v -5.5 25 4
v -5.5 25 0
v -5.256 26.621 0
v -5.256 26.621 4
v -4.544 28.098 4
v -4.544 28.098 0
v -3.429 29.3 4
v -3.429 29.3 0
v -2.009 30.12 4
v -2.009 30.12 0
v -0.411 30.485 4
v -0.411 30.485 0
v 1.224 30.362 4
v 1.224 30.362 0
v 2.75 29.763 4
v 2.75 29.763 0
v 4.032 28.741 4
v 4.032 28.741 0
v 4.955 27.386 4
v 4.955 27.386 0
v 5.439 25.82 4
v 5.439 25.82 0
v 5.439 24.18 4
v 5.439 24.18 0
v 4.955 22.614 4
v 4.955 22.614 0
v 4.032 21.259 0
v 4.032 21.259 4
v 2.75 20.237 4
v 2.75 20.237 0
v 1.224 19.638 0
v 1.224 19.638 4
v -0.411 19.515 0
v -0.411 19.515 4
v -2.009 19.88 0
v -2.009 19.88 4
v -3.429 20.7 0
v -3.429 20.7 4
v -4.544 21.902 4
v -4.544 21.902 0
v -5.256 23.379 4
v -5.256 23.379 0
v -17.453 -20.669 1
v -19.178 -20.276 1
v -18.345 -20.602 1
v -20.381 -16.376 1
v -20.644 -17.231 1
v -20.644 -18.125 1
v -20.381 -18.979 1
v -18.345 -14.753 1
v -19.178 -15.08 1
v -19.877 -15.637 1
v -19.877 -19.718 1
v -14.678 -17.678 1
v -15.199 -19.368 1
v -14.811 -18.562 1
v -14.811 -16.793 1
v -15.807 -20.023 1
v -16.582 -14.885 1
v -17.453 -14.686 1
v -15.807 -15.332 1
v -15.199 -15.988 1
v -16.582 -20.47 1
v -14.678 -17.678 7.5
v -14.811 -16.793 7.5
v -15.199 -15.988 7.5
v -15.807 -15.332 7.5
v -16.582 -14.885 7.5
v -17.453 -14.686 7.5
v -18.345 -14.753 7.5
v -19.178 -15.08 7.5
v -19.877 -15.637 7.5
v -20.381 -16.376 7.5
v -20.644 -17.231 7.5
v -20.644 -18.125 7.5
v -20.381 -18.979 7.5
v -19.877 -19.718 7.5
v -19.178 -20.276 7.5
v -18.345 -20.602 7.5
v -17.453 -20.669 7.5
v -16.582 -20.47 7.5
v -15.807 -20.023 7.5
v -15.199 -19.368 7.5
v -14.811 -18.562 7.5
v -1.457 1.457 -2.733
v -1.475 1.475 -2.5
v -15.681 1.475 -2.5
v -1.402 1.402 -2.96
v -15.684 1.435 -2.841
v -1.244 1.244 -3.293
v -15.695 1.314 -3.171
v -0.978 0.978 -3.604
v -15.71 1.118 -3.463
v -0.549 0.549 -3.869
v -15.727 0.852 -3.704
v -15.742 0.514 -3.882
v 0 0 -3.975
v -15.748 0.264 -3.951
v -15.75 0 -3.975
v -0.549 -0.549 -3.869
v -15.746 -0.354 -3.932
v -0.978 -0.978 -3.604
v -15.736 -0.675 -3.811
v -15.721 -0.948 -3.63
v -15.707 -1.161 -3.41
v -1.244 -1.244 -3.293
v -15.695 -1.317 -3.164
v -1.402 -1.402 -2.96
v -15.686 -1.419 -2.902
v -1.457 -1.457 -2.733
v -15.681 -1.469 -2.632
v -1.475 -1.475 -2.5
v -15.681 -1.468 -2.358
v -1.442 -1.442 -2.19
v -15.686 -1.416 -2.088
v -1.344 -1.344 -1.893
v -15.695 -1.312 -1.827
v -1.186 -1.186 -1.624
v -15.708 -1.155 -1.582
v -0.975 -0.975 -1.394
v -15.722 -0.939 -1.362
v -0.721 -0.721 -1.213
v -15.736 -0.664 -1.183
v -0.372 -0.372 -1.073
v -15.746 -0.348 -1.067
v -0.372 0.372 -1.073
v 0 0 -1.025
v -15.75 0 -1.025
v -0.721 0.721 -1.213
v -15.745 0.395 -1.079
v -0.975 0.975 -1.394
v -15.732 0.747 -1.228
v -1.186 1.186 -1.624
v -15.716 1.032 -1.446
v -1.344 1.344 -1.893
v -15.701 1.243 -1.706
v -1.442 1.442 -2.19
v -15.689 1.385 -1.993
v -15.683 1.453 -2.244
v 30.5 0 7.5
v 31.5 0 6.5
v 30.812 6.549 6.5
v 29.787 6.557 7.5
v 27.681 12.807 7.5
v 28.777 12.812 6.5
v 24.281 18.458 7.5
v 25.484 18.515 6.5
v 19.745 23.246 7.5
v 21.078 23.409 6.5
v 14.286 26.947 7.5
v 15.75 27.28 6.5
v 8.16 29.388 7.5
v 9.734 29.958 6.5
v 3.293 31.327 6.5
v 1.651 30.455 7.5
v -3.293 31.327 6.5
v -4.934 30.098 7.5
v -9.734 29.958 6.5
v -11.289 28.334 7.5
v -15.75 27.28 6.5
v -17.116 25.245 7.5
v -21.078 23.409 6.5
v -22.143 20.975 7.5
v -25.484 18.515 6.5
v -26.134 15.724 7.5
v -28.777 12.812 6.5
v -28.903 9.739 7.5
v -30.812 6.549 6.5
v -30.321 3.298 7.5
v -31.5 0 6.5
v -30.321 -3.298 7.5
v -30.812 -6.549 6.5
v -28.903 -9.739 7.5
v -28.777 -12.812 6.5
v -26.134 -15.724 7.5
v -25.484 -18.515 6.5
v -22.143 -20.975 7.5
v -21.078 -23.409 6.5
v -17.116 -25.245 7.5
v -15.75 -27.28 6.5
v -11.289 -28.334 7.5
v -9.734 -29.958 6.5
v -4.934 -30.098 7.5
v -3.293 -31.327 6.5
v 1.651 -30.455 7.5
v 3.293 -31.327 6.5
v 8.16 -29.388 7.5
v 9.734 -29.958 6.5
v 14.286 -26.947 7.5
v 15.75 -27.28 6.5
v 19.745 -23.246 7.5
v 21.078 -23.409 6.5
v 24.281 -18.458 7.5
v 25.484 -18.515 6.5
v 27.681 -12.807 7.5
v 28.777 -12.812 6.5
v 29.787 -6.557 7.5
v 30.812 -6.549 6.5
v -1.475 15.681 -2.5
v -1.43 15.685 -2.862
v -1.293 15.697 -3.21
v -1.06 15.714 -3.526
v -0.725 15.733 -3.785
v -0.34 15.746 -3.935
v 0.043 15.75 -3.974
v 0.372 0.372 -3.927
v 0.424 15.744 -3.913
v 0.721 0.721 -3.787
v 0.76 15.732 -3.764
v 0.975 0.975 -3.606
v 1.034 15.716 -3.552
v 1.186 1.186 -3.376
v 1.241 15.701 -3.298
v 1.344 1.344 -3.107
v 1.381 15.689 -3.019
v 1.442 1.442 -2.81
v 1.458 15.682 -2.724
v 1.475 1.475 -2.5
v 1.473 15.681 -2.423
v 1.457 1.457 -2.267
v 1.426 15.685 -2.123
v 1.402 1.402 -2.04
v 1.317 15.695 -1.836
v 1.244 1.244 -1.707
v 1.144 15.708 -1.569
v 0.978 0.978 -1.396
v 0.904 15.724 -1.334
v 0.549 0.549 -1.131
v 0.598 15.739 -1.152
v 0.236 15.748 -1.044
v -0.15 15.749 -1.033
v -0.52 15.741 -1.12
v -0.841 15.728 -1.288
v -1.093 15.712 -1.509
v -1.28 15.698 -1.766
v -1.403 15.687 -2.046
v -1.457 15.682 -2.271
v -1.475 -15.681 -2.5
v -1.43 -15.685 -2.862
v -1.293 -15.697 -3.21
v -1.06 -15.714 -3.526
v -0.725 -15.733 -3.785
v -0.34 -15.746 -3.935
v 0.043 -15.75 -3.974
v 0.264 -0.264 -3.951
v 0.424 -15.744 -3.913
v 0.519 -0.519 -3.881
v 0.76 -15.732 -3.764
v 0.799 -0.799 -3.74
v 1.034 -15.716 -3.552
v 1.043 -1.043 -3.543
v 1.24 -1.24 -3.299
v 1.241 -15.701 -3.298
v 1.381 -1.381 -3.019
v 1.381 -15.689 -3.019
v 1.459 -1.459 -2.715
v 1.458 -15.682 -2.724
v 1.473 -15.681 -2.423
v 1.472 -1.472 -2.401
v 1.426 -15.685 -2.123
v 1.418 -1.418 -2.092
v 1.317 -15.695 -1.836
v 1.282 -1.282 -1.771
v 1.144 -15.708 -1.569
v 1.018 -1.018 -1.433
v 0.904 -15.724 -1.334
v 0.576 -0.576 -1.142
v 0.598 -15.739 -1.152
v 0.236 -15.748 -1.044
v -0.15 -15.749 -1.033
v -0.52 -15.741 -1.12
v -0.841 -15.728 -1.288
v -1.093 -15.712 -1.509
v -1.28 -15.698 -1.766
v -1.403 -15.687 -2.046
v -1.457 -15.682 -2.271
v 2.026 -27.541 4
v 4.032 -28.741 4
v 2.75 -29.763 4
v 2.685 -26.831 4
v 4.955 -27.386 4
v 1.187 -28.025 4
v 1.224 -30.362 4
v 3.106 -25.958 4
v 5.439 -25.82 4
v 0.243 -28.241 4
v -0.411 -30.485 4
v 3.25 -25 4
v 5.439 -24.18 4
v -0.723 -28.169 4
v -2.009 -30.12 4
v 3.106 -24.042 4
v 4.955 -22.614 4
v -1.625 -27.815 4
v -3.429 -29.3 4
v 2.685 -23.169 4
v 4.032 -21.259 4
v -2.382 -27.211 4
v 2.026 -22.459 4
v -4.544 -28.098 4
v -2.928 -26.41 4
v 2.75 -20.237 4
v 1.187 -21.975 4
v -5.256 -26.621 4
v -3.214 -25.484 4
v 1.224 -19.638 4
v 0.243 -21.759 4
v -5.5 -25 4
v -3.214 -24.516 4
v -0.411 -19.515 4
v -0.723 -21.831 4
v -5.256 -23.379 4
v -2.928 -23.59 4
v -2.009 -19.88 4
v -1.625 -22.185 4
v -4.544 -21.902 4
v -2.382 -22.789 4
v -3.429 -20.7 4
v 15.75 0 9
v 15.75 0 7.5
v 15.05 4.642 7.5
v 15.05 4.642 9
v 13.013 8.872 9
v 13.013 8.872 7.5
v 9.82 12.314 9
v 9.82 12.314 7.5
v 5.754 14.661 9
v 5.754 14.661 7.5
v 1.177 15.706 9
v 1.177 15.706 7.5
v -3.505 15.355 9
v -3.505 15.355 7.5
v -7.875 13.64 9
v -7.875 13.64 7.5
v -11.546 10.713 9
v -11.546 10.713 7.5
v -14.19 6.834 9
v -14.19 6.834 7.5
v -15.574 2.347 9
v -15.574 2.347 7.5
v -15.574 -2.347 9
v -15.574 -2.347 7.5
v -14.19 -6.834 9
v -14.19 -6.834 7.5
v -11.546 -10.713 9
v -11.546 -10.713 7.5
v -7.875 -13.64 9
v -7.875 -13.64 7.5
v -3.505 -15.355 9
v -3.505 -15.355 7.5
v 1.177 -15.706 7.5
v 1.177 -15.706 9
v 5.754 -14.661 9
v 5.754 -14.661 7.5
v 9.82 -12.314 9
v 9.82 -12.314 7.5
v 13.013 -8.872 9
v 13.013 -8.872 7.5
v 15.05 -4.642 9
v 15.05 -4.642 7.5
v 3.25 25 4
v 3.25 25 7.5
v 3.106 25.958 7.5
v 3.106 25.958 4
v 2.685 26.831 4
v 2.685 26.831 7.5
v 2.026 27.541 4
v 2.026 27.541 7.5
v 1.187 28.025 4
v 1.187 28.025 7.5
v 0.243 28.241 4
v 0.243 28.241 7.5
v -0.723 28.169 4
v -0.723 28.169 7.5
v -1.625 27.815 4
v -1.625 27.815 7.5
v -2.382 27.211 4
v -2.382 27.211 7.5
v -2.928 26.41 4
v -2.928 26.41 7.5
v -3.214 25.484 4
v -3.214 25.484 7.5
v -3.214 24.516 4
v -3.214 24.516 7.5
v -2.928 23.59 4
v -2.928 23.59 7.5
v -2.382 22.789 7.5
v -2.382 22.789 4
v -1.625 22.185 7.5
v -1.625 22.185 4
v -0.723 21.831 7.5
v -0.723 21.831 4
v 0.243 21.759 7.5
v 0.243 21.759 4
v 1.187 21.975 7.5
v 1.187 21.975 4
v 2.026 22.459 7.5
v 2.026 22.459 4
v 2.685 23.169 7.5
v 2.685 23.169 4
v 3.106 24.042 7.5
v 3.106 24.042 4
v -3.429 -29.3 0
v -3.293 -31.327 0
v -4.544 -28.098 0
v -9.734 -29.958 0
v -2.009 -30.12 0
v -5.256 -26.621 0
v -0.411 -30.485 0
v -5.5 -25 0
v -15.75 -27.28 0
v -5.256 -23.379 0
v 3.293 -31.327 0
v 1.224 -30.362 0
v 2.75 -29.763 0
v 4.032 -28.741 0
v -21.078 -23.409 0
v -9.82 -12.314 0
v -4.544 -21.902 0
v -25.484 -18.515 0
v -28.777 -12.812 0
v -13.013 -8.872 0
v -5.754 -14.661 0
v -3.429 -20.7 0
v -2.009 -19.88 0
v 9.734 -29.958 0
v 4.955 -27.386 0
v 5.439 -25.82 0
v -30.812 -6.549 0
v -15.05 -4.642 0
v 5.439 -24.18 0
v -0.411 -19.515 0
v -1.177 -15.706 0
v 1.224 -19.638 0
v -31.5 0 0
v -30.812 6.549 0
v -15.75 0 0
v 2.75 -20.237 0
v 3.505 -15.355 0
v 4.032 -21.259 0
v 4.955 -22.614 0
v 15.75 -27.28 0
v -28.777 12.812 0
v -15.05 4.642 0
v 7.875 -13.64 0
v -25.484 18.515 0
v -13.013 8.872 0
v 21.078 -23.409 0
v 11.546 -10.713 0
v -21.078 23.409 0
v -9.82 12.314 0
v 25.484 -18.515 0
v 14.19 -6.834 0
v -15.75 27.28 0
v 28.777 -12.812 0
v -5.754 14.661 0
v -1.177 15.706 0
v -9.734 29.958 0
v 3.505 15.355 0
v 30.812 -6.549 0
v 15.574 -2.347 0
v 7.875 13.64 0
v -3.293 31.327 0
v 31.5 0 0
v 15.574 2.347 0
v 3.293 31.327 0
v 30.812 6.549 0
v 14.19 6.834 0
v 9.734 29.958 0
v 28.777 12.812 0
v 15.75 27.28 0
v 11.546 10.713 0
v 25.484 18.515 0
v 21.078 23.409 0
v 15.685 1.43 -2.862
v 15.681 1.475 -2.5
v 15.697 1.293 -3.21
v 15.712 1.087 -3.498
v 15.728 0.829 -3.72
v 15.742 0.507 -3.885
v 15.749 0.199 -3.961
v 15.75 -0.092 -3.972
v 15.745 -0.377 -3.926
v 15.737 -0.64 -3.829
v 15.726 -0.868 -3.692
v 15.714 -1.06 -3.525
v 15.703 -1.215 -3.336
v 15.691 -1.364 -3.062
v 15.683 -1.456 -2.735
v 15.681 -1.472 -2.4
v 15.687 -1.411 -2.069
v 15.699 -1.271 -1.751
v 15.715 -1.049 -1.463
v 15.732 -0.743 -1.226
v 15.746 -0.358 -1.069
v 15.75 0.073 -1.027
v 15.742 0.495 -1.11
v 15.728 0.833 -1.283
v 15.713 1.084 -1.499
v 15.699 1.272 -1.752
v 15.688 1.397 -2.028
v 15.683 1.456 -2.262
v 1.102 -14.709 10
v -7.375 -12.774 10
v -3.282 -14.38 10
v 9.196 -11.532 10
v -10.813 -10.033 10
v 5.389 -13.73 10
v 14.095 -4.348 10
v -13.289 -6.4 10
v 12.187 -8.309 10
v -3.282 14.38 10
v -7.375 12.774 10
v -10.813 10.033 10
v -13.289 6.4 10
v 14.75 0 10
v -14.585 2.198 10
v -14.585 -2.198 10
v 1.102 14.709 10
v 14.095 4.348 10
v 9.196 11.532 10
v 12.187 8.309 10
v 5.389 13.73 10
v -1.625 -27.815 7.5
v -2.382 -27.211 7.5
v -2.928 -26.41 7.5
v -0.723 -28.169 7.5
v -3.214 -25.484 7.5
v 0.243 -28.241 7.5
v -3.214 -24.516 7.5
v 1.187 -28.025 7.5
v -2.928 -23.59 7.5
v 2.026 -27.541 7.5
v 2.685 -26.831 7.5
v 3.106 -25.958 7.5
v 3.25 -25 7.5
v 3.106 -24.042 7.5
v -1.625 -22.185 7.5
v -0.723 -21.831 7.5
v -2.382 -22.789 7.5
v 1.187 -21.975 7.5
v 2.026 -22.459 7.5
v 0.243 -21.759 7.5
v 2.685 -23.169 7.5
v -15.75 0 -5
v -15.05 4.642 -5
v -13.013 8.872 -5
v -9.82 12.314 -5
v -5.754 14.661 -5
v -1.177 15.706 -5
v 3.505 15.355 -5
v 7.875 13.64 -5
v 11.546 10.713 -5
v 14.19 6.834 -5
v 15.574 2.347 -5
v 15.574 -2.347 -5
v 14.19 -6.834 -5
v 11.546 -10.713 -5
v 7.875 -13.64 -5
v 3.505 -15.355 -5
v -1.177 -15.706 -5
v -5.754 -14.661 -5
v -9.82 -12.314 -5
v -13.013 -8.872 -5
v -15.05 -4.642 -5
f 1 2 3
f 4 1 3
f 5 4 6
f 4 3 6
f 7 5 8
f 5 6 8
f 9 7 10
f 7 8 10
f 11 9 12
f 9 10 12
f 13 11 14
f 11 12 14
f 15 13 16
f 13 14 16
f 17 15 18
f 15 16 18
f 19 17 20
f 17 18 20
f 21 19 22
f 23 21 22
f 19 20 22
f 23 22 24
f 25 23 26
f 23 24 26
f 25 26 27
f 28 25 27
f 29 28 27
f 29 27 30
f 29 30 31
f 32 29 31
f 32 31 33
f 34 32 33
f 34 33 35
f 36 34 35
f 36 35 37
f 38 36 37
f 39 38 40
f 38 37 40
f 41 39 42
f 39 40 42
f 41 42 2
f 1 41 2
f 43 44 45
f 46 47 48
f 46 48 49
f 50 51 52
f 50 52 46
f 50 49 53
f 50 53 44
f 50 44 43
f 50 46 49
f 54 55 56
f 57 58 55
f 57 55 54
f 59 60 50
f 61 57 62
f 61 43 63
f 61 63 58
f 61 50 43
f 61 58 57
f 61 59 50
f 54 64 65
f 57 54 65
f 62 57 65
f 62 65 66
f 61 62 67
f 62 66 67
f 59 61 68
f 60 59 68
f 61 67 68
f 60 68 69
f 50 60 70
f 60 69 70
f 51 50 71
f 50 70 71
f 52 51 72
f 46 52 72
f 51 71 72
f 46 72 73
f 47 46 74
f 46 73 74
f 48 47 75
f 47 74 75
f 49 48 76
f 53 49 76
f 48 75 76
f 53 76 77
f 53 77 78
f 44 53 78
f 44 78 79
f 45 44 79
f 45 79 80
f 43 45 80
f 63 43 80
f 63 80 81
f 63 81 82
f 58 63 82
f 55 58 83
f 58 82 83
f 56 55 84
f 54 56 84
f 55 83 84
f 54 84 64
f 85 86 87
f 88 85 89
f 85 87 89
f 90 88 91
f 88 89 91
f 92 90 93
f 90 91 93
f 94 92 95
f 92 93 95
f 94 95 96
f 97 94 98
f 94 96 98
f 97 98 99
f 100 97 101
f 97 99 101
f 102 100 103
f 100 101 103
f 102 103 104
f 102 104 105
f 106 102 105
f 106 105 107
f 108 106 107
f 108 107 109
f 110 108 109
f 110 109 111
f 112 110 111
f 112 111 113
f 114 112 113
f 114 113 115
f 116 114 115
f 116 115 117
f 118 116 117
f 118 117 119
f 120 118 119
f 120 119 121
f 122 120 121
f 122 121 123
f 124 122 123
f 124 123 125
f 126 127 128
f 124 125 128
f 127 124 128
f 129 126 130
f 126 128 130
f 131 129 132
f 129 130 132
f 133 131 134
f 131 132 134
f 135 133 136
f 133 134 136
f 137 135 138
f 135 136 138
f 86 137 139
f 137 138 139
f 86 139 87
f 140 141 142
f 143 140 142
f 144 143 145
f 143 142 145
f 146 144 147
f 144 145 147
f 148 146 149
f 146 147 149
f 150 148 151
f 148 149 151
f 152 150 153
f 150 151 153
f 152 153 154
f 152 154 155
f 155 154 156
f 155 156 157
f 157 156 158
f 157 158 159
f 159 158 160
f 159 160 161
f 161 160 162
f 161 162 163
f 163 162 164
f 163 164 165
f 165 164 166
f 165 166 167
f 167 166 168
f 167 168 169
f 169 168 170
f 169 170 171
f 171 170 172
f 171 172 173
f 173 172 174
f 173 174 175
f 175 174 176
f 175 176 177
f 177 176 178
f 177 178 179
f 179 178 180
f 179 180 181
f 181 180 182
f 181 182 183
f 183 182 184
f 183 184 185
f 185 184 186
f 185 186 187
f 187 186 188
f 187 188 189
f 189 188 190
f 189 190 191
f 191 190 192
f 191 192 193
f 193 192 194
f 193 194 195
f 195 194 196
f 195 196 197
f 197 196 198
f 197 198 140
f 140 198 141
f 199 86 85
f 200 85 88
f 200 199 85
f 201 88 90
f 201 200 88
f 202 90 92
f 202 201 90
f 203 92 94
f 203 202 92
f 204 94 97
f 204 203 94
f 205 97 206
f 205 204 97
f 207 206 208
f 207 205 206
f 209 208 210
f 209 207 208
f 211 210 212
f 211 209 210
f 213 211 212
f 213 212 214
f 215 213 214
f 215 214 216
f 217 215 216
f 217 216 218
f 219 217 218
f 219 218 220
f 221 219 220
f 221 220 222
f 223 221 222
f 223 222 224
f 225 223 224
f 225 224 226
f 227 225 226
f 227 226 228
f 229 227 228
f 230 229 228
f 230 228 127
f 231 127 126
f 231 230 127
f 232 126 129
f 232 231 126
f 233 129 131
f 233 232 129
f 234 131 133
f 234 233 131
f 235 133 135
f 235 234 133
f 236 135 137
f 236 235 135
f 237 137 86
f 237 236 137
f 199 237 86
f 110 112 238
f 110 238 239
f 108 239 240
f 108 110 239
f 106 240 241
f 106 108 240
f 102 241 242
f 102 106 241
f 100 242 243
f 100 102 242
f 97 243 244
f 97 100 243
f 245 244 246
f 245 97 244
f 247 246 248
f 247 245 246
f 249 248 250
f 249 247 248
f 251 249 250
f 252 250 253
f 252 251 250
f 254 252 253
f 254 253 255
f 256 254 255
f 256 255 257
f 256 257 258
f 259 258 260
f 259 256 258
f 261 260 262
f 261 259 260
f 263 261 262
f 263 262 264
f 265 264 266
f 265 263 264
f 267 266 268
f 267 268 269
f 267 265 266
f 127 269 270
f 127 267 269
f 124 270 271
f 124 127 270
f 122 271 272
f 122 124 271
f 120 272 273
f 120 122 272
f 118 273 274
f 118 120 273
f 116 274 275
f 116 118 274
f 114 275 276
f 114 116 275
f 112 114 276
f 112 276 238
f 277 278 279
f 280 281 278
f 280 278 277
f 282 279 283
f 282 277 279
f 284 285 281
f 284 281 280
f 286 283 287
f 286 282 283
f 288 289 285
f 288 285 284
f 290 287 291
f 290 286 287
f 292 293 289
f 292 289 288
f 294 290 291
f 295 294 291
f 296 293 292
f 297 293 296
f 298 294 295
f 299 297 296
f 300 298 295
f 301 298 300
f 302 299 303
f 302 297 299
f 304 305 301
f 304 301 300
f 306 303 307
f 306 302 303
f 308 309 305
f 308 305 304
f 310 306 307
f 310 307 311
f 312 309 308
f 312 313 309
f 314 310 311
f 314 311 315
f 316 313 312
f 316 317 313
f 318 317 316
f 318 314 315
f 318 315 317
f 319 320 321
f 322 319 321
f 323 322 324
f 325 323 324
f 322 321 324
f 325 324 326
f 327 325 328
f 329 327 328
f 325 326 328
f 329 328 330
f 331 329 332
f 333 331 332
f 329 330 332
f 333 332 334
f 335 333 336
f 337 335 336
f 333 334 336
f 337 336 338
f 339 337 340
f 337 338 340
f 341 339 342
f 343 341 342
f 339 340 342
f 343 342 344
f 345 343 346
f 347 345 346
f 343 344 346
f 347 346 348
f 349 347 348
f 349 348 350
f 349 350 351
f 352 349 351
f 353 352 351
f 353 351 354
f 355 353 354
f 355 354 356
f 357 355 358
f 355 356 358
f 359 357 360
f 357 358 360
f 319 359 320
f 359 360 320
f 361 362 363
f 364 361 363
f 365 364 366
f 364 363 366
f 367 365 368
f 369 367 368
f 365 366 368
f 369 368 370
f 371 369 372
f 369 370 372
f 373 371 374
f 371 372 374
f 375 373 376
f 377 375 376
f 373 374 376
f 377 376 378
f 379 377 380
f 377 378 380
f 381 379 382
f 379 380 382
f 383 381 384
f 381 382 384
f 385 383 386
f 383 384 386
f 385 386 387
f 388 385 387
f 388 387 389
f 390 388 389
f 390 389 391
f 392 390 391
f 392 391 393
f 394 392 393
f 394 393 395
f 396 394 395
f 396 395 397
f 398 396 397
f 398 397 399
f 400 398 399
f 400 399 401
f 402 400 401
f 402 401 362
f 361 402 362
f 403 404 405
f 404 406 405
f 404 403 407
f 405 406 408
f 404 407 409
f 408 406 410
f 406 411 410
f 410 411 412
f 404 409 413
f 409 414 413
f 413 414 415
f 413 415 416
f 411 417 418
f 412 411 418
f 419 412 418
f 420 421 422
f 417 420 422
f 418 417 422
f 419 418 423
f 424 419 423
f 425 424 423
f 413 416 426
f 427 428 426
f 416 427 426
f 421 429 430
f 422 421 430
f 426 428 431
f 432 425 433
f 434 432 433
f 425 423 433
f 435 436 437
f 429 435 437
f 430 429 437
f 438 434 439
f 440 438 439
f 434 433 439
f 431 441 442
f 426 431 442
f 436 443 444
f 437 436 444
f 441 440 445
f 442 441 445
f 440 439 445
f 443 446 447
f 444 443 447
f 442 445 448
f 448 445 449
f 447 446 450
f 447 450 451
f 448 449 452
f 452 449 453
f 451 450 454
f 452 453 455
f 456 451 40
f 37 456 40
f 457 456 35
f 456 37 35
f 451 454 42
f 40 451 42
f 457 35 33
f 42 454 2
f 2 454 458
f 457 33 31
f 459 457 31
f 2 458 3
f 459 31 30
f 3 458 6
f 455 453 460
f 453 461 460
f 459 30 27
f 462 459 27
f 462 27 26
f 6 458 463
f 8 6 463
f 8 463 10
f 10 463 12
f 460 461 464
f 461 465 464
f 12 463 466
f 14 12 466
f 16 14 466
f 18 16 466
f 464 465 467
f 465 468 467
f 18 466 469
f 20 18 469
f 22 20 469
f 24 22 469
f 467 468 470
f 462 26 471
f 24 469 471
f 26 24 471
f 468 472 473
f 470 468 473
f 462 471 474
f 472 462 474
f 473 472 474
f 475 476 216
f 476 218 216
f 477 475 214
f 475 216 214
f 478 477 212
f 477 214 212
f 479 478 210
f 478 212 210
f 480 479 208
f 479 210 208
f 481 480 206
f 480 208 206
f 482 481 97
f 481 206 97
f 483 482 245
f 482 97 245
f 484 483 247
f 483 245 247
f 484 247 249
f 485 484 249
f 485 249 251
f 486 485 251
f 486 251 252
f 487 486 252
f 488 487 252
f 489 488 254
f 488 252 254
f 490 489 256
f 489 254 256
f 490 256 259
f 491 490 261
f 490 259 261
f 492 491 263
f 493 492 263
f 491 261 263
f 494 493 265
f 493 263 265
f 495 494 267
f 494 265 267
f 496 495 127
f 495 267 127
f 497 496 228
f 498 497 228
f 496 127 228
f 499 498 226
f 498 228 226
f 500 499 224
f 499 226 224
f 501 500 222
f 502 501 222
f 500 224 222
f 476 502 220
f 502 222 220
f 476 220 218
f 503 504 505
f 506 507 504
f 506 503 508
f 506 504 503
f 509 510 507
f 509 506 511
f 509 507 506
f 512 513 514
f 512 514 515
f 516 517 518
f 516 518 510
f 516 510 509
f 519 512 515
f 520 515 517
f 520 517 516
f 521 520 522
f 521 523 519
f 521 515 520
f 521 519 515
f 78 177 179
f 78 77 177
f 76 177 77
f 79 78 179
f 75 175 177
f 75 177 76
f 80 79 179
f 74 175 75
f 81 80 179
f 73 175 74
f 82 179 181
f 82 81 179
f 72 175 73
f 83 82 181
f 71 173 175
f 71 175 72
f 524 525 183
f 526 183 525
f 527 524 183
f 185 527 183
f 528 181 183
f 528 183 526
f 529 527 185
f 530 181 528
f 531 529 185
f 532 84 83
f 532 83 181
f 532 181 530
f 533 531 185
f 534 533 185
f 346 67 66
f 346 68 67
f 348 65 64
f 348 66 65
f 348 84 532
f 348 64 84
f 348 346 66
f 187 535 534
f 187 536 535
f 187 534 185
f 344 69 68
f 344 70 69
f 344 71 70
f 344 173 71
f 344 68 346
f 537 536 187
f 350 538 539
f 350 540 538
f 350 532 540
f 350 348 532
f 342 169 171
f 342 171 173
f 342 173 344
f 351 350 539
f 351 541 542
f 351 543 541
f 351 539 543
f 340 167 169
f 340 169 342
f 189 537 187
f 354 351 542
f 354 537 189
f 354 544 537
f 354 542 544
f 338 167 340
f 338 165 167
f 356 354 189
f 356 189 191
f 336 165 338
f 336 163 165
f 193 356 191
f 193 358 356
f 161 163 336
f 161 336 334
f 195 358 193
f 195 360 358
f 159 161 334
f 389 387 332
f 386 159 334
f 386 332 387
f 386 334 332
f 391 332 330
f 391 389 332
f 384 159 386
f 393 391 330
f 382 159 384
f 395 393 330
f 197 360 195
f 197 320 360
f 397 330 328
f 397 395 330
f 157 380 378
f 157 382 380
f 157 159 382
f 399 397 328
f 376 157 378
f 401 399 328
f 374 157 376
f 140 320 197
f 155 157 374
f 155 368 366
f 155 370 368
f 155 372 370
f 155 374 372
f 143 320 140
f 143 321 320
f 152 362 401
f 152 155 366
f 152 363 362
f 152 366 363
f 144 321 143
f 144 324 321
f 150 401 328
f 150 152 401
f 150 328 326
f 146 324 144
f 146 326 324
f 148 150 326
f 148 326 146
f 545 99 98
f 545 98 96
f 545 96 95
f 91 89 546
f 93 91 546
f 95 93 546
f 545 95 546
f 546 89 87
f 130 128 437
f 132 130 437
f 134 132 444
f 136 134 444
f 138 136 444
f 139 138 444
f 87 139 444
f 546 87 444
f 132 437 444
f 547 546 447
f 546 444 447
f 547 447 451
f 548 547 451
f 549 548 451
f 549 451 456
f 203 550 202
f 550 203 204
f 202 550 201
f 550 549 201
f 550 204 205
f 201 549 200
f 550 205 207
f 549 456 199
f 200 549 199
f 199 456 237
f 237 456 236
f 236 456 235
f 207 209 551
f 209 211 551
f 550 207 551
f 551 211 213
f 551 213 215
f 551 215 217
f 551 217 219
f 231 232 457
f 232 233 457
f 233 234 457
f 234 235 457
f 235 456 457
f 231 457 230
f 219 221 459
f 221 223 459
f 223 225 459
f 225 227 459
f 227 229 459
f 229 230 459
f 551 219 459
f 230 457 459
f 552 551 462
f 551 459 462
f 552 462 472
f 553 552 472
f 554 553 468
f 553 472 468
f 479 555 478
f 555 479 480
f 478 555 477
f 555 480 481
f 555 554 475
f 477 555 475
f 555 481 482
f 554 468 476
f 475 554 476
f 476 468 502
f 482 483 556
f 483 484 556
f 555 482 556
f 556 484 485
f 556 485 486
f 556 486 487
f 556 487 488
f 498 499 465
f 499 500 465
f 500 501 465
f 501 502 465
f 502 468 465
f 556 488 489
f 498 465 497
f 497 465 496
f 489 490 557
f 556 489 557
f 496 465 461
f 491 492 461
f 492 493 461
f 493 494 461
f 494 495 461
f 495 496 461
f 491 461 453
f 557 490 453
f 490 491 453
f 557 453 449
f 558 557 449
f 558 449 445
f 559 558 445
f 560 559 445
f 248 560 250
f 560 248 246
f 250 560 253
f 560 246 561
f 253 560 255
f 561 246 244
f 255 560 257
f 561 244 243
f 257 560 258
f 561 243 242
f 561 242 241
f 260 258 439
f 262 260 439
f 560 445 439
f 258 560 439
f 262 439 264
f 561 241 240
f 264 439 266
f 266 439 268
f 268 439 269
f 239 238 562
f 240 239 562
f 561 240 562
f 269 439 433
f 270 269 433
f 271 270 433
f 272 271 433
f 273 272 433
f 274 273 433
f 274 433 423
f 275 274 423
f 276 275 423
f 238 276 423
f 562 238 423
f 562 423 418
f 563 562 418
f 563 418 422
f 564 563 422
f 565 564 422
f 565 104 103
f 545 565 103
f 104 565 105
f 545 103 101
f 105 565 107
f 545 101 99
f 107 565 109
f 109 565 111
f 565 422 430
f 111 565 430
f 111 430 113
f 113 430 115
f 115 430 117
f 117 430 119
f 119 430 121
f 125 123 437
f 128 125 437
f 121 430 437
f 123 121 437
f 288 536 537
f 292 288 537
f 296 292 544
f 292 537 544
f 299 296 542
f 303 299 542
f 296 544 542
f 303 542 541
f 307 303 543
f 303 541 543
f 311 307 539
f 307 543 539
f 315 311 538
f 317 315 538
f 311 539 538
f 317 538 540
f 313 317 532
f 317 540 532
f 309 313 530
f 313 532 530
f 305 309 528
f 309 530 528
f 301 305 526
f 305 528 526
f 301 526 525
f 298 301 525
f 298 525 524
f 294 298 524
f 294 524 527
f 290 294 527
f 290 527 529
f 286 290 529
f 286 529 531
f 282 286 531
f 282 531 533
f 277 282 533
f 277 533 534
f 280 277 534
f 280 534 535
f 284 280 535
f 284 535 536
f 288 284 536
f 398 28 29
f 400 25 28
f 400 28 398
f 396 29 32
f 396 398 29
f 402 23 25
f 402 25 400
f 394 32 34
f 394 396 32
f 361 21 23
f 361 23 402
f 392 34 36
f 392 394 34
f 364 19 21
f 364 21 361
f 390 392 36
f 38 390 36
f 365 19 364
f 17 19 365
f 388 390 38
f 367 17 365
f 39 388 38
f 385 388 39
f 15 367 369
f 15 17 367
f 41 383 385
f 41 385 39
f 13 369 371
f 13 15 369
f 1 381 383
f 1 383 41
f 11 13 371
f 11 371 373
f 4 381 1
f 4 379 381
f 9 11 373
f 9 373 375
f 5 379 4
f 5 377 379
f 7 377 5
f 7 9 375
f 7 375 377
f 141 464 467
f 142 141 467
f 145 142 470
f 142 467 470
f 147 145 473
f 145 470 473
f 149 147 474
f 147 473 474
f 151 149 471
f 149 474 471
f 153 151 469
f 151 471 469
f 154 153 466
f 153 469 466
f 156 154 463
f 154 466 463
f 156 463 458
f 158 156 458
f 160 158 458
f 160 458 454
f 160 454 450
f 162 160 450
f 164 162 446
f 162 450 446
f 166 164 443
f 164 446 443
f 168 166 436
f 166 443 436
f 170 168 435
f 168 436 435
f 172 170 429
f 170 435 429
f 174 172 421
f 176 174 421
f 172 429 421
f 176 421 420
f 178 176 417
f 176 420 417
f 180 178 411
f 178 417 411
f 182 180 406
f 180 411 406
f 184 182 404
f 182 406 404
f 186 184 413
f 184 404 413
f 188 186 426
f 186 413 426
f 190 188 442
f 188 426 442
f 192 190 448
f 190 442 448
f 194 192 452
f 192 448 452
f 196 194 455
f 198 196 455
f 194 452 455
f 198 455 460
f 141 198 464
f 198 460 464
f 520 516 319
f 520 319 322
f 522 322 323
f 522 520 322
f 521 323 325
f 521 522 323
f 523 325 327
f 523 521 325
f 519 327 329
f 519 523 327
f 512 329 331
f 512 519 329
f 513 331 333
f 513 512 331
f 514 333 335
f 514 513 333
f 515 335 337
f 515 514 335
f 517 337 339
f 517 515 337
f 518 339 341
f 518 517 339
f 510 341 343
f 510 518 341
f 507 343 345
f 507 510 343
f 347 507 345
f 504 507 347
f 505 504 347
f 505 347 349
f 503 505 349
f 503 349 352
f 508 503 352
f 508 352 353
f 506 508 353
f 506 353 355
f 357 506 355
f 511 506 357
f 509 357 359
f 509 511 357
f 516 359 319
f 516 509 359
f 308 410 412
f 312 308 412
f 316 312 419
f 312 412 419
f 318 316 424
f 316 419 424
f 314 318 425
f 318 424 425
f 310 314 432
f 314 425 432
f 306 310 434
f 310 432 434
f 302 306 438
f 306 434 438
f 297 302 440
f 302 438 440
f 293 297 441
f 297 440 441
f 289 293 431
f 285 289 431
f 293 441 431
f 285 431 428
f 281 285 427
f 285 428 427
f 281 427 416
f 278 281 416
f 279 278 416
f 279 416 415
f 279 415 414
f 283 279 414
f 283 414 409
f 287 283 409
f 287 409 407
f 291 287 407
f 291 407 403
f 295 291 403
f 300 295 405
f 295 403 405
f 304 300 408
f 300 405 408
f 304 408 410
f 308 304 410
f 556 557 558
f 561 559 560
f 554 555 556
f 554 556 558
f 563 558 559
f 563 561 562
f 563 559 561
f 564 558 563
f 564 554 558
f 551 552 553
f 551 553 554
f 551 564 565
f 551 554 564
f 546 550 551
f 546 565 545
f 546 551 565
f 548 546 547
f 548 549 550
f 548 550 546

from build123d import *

# Parameters (mm, degrees)
SKETCH_1_R          = 31.5
EXTRUDE_1_DEPTH     = 7.5
SKETCH_2_R          = 15.75
EXTRUDE_2_DEPTH     = 2.5
CHAMFER_1_SIZE      = 1
CHAMFER_2_SIZE      = 1
SKETCH_3_R          = 3.25
SKETCH_3_R_2        = 3
CUT_EXTRUDE_1_DEPTH = 6.5
SKETCH_4_R          = 5.5
CUT_EXTRUDE_2_DEPTH = 4
SKETCH_9_R          = 15.75
EXTRUDE_5_DEPTH     = 5
SKETCH_10_W         = 1.475
SKETCH_10_H         = 34.619836182
SKETCH_12_W         = 34.390944704
SKETCH_12_H         = 1.475


with BuildPart() as part:
    # 草图1 → 凸台-拉伸1 (new body)
    with BuildSketch(Plane.XY):
        Circle(SKETCH_1_R)
    extrude(amount=EXTRUDE_1_DEPTH)

    # 草图2 → 凸台-拉伸2 (add)
    with BuildSketch(Plane.XY.offset(7.5)):
        Circle(SKETCH_2_R)
    extrude(amount=EXTRUDE_2_DEPTH)

    # 倒角1
    chamfer_1_edges = [part.edges().sort_by_distance(p)[0] for p in [
        (-15.75, 0, 10),
    ]]
    chamfer(chamfer_1_edges, length=CHAMFER_1_SIZE)

    # 倒角2
    chamfer_2_edges = [part.edges().sort_by_distance(p)[0] for p in [
        (-31.5, 0, 7.5),
    ]]
    chamfer(chamfer_2_edges, length=CHAMFER_2_SIZE)

    # 草图3 → 切除-拉伸1 (cut)
    with BuildSketch(Plane.XY.offset(7.5)):
        with Locations((0, 25)):
            Circle(SKETCH_3_R)
        with Locations((0, -25)):
            Circle(SKETCH_3_R)
        with Locations((-17.67766953, -17.67766953)):
            Circle(SKETCH_3_R_2)
    extrude(amount=-CUT_EXTRUDE_1_DEPTH, mode=Mode.SUBTRACT)

    # 草图4 → 切除-拉伸2 (cut)
    with BuildSketch(Plane(origin=(0, 0, 0), x_dir=(-1, 0, 0), z_dir=(0, 0, -1))):
        with Locations((0, -25)):
            Circle(SKETCH_4_R)
        with Locations((0, 25)):
            Circle(SKETCH_4_R)
    extrude(amount=-CUT_EXTRUDE_2_DEPTH, mode=Mode.SUBTRACT)

    # 草图9 → 凸台-拉伸5 (add)
    with BuildSketch(Plane(origin=(0, 0, 0), x_dir=(-1, 0, 0), z_dir=(0, 0, -1))):
        Circle(SKETCH_9_R)
    extrude(amount=EXTRUDE_5_DEPTH)

    # 草图10 → 切除-旋转1 (revolve, cut)
    with BuildSketch(Plane(origin=(0, 0, -2.5), x_dir=(-1, 0, 0), z_dir=(0, 0, -1))):
        with Locations((0.7375, 0.028611435)):
            Rectangle(SKETCH_10_W, SKETCH_10_H)
    revolve(axis=Axis((0, 17.338529526, -2.5), (0, -1, 0)), mode=Mode.SUBTRACT)

    # 草图12 → 切除-旋转2 (revolve, cut)
    with BuildSketch(Plane(origin=(0, 0, -2.5), x_dir=(-1, 0, 0), z_dir=(0, 0, -1))):
        with Locations((-0.028611435, 0.7375)):
            Rectangle(SKETCH_12_W, SKETCH_12_H)
    revolve(axis=Axis((17.224083787, 0, -2.5), (-1, 0, 0)), mode=Mode.SUBTRACT)


solid = part.part
